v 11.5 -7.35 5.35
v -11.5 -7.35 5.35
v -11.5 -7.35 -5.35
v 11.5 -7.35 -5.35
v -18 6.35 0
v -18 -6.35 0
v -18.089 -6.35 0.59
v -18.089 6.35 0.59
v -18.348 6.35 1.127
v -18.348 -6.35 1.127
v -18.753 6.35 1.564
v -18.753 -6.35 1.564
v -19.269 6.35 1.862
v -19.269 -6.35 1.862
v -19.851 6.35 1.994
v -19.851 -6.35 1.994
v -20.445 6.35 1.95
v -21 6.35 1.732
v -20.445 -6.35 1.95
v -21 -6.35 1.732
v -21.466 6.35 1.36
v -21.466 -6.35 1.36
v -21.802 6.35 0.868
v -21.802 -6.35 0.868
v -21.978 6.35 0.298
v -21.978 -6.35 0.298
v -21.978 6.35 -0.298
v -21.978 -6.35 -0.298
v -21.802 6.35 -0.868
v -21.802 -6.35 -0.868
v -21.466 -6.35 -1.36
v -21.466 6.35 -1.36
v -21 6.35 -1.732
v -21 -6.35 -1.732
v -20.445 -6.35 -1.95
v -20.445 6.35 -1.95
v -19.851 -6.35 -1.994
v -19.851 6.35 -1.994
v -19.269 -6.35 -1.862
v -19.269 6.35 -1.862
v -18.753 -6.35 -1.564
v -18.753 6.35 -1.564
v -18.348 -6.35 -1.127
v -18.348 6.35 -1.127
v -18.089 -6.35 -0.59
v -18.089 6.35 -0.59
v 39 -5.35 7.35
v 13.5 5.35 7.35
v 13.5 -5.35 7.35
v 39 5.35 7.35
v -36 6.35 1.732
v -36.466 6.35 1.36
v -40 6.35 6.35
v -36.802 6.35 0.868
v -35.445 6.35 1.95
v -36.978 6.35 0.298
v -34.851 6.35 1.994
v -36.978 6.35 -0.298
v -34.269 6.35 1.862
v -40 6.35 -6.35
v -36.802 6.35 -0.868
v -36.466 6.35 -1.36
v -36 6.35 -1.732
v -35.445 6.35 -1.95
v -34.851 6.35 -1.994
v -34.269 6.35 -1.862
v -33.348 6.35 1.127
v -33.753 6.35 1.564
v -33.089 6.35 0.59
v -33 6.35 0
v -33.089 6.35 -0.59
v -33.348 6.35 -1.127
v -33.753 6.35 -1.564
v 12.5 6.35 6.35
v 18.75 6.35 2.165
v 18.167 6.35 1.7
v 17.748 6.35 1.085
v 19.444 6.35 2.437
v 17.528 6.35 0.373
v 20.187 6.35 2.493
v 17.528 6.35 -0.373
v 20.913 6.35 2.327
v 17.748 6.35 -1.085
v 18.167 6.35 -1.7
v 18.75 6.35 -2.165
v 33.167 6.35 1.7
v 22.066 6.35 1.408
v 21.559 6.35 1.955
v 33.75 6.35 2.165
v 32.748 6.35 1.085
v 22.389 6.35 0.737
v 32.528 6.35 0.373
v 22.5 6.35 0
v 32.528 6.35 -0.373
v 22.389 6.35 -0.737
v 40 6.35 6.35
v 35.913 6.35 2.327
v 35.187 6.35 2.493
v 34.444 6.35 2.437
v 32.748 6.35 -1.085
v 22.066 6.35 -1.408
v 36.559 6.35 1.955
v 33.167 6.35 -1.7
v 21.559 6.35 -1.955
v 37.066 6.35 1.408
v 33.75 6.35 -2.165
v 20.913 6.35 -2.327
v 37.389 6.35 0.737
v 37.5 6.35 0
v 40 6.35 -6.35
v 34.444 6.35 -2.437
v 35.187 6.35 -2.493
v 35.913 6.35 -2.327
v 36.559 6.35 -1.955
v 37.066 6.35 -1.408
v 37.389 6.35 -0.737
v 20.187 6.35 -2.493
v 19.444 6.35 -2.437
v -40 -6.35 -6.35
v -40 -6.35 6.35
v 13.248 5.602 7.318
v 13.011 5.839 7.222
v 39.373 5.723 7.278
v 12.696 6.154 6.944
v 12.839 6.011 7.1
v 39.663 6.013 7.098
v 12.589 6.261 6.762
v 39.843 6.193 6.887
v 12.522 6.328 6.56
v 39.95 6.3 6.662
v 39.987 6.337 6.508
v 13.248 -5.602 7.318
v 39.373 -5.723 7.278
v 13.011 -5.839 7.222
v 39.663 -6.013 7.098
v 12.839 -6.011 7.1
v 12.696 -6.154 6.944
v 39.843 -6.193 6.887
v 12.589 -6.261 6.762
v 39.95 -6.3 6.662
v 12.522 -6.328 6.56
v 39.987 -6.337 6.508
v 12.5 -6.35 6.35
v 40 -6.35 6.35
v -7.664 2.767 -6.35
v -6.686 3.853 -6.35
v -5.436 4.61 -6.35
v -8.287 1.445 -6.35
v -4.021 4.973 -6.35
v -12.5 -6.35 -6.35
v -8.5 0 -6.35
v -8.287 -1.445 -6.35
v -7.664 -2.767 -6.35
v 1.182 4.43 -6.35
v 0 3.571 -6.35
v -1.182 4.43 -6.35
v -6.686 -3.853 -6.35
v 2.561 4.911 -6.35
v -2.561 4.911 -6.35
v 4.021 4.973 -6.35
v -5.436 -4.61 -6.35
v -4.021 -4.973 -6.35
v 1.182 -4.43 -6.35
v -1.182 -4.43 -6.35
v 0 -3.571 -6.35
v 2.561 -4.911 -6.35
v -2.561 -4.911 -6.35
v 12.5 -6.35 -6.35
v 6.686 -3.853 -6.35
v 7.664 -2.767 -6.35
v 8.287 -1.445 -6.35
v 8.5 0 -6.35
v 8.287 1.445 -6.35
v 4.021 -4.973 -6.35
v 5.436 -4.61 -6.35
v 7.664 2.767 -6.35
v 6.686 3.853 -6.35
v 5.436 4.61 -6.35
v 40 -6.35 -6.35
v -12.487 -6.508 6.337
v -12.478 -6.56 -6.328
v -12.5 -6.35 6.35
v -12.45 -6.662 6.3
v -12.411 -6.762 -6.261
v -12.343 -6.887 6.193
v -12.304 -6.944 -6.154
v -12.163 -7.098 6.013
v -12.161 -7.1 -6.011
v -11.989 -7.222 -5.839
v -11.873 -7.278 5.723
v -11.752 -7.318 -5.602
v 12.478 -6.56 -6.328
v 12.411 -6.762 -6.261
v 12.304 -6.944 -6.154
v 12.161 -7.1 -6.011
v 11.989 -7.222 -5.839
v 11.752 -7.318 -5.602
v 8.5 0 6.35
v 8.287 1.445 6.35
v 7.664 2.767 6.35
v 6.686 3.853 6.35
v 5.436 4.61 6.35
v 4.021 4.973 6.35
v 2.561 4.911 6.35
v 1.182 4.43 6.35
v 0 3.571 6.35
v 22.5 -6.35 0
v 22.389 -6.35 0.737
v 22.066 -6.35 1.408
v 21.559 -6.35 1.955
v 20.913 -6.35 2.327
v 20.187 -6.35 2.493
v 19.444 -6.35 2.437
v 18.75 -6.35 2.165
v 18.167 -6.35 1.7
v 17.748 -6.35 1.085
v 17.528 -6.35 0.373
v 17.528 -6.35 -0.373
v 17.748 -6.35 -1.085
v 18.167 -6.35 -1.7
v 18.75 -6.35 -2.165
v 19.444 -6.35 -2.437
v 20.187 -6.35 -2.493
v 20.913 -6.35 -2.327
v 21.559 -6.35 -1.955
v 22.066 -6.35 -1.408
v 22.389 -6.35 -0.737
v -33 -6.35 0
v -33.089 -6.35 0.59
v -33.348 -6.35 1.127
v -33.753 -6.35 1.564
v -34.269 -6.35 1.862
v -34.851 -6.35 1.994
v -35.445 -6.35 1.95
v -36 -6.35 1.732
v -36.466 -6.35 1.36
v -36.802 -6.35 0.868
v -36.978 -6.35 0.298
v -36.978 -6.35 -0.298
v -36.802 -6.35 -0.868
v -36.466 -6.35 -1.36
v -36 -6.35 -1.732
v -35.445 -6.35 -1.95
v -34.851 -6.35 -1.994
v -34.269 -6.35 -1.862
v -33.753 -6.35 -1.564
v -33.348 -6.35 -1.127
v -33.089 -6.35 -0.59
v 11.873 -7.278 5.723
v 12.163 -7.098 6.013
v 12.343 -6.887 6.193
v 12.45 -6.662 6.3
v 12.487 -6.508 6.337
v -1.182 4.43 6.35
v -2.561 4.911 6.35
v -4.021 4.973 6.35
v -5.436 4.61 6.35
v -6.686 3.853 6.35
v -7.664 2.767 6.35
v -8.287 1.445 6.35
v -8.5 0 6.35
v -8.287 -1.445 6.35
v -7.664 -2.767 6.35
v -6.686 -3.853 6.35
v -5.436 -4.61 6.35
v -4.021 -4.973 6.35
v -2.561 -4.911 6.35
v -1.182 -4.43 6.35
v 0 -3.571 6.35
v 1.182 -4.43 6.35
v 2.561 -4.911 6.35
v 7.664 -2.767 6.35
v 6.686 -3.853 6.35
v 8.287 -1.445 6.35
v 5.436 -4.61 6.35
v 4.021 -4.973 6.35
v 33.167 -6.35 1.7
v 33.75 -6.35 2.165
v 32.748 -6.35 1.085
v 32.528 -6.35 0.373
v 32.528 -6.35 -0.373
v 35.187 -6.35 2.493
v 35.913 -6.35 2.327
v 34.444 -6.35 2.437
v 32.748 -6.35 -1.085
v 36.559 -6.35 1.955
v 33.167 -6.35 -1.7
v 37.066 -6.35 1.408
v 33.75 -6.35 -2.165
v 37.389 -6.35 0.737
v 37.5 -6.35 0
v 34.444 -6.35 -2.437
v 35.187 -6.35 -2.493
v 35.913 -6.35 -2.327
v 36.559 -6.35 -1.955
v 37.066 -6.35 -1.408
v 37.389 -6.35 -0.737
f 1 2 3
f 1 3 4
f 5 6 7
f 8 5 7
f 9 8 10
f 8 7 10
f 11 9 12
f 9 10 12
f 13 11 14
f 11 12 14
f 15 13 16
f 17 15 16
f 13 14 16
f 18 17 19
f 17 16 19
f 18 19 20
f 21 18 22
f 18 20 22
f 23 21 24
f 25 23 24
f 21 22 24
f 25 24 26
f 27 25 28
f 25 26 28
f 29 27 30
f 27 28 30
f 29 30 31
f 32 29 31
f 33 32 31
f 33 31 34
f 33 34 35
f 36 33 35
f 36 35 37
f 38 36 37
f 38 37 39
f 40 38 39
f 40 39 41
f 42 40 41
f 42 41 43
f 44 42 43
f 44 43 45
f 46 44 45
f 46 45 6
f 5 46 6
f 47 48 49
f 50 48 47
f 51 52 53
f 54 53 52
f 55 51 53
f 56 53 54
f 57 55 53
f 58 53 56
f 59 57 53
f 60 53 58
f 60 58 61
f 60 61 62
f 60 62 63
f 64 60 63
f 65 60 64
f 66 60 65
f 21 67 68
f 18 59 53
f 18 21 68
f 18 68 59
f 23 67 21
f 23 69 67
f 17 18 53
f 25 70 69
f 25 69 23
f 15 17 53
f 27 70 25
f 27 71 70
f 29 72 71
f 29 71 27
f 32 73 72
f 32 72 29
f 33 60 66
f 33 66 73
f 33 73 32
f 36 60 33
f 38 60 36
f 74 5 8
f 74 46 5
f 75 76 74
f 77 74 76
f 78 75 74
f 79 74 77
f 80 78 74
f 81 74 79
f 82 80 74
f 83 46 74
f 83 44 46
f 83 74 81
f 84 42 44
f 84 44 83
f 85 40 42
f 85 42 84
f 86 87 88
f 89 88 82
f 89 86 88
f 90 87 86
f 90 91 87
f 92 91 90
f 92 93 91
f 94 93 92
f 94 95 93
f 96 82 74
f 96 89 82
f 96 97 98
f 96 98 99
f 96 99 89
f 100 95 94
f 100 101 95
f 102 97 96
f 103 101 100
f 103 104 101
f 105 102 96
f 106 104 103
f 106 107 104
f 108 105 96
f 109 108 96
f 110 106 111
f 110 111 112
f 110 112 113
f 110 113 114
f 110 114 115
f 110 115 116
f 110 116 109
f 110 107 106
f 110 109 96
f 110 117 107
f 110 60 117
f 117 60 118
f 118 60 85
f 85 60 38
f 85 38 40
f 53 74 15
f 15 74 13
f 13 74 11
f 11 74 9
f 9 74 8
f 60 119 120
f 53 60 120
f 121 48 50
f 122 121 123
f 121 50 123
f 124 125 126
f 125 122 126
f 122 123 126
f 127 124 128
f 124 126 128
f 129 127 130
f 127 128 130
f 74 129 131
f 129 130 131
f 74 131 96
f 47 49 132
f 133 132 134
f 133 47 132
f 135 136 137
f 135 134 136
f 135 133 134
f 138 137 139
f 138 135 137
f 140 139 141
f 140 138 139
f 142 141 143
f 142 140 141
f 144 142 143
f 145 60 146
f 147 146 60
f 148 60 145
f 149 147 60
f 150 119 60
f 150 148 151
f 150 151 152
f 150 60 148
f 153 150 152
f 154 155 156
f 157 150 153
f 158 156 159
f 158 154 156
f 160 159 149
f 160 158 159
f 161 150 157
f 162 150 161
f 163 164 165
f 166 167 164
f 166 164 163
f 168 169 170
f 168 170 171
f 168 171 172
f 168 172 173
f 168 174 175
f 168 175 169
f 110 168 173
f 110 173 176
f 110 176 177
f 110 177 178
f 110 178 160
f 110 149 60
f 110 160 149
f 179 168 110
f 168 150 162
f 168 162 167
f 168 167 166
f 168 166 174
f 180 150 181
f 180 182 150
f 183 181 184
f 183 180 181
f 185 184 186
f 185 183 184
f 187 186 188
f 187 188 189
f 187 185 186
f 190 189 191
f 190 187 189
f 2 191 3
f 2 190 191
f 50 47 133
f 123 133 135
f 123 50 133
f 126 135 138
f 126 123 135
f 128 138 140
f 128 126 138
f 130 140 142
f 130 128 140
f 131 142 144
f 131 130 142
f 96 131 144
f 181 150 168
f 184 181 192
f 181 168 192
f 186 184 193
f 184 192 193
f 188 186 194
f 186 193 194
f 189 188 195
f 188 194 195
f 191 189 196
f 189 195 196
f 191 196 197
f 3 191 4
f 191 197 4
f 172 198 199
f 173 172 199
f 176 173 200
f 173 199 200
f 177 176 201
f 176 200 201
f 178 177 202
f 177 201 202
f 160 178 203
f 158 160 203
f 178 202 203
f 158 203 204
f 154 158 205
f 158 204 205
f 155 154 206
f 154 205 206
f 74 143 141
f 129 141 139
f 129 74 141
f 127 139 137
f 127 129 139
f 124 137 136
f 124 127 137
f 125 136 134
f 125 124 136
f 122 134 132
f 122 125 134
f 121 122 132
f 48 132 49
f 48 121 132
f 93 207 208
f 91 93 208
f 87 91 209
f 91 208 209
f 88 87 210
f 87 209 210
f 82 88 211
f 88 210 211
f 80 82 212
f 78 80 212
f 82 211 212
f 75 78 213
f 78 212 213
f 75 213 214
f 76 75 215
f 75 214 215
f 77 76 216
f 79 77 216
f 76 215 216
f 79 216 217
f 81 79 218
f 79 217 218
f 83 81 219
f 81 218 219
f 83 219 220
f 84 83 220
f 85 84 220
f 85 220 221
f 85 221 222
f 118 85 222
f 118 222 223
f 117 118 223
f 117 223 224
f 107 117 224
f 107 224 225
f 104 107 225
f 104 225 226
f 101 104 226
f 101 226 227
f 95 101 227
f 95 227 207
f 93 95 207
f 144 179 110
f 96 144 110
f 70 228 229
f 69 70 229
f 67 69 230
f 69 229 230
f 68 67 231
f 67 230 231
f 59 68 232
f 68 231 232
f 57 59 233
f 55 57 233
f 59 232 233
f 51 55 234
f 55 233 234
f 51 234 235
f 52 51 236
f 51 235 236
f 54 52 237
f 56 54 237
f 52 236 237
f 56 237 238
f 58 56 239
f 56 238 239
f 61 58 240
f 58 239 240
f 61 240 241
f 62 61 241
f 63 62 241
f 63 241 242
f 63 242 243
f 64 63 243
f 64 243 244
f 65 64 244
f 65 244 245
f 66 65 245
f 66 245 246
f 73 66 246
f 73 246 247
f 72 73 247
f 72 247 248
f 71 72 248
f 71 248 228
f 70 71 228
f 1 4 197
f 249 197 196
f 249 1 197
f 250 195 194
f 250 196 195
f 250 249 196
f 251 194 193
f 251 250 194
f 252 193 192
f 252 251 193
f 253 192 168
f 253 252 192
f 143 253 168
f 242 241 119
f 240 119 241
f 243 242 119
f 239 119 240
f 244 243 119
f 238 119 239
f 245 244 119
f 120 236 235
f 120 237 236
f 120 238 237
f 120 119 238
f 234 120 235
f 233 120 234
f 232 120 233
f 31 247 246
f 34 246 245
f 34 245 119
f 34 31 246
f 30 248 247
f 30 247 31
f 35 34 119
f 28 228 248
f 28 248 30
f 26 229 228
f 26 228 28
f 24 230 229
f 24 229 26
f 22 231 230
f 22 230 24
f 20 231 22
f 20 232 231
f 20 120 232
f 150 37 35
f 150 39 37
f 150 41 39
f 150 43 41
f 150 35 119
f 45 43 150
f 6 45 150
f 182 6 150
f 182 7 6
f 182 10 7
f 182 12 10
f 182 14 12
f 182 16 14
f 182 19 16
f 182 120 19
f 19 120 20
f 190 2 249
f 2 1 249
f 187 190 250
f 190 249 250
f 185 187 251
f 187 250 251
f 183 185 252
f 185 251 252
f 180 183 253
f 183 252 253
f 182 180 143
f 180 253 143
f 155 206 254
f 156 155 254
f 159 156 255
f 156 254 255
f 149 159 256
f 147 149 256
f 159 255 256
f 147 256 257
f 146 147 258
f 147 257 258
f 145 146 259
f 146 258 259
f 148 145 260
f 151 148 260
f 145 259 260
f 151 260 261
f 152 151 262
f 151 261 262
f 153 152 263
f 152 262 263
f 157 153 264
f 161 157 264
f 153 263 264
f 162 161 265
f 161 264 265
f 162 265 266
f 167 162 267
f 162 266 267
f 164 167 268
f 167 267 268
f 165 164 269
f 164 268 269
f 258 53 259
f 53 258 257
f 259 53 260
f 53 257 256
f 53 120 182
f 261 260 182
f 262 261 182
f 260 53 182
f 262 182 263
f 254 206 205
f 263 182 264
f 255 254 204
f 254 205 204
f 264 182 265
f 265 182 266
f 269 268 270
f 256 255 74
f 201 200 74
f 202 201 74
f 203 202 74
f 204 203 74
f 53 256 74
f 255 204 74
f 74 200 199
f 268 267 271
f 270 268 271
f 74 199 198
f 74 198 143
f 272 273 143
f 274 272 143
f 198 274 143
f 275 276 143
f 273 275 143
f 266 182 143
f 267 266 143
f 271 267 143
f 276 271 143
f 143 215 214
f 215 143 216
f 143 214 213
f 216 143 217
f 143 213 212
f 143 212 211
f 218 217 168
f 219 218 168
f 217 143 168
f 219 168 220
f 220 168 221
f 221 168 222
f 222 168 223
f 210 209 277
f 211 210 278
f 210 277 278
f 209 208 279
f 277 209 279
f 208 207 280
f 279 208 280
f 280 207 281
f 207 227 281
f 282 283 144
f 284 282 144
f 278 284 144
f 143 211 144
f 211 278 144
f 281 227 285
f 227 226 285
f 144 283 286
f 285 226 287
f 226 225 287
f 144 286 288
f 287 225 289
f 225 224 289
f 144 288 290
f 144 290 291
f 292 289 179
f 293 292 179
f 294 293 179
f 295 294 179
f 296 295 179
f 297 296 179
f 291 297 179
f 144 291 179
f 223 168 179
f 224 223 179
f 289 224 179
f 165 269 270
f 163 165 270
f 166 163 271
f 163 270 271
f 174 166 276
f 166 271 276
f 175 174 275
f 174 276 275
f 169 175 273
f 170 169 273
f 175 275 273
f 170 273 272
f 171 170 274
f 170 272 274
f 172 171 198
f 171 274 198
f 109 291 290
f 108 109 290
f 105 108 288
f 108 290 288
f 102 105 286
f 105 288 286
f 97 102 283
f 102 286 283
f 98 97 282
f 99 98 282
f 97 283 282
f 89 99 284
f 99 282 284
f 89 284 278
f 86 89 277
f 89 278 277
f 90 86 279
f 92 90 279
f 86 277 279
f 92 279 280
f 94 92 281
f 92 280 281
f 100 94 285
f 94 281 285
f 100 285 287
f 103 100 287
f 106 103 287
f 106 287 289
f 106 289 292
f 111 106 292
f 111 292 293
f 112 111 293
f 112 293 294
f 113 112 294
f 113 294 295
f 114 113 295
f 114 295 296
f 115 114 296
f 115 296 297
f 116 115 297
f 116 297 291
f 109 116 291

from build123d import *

# Parameters (mm, degrees)
F0_W     = 80
F0_H     = 12.7
F1_DEPTH = 6.35
F2_R     = 2
F2_R_2   = 2.5
F3_DEPTH = 12.701
F5_DEPTH = 12.701
F6_W     = 25
F6_H     = 12.7
F7_DEPTH = 1
F8_W     = 27.5
F8_H     = 12.7
F9_DEPTH = 1
F10_R    = 0.99999


# Not quite as in the source:
# - a fillet or chamfer is up to 0.001 mm smaller than in the source, because OpenCascade refuses the exact size


with BuildPart() as f1:
    # F0 (on Front) → F1 (new body, symmetric)
    with BuildSketch(Plane.XZ):
        Rectangle(F0_W, F0_H)
    extrude(amount=F1_DEPTH, both=True)

    # F2 (on face) → F3 (cut, through all)
    with BuildSketch(Plane.XZ.offset(6.35)):
        with Locations((-35, 0)):
            Circle(F2_R)
        with Locations((-20, 0)):
            Circle(F2_R)
        with Locations((35, 0)):
            Circle(F2_R_2)
        with Locations((20, 0)):
            Circle(F2_R_2)
    extrude(amount=-F3_DEPTH, mode=Mode.SUBTRACT)

    # F4 (on face) → F5 (cut, through all)
    with BuildSketch(Plane.XY.offset(6.35)):
        with BuildLine():
            ThreePointArc((0, -3.5707142143), (5.4364916731, -4.6097722286), (8.5, 0))
            ThreePointArc((8.5, 0), (5.4364916731, 4.6097722286), (0, 3.5707142143))
            ThreePointArc((0, 3.5707142143), (1.1097722286, 1.9364916731), (1.5, 0))
            ThreePointArc((1.5, 0), (1.1097722286, -1.9364916731), (0, -3.5707142143))
        make_face()
        with BuildLine():
            ThreePointArc((1.5, 0), (1.1097722286, 1.9364916731), (0, 3.5707142143))
            ThreePointArc((0, 3.5707142143), (-1.5, 0), (0, -3.5707142143))
            ThreePointArc((0, -3.5707142143), (1.1097722286, -1.9364916731), (1.5, 0))
        make_face()
        with BuildLine():
            ThreePointArc((0, -3.5707142143), (-1.5, 0), (0, 3.5707142143))
            ThreePointArc((0, 3.5707142143), (-8.5, 0), (0, -3.5707142143))
        make_face()
    extrude(amount=-F5_DEPTH, mode=Mode.SUBTRACT)

    # F6 (on face) → F7 (join)
    with BuildSketch(Plane.XZ.offset(6.35)):
        Rectangle(F6_W, F6_H)
    extrude(amount=F7_DEPTH)

    # F8 (on face) → F9 (join)
    with BuildSketch(Plane.XY.offset(6.35)):
        with Locations((26.25, 0)):
            Rectangle(F8_W, F8_H)
    extrude(amount=F9_DEPTH)

    # F10 (radius 1 in the source; OpenCascade refuses exactly that, so slightly less here)
    f10_edges = [f1.edges().sort_by_distance(p)[0] for p in [
        (12.5, 0, 7.35),
        (40, 0, 7.35),
        (0, -7.35, 6.35),
        (0, -7.35, -6.35),
        (12.5, -7.35, 0),
        (-12.5, -7.35, 0),
        (26.25, 6.35, 7.35),
        (26.25, -6.35, 7.35),
    ]]
    fillet(f10_edges, radius=F10_R)


solid = f1.part
